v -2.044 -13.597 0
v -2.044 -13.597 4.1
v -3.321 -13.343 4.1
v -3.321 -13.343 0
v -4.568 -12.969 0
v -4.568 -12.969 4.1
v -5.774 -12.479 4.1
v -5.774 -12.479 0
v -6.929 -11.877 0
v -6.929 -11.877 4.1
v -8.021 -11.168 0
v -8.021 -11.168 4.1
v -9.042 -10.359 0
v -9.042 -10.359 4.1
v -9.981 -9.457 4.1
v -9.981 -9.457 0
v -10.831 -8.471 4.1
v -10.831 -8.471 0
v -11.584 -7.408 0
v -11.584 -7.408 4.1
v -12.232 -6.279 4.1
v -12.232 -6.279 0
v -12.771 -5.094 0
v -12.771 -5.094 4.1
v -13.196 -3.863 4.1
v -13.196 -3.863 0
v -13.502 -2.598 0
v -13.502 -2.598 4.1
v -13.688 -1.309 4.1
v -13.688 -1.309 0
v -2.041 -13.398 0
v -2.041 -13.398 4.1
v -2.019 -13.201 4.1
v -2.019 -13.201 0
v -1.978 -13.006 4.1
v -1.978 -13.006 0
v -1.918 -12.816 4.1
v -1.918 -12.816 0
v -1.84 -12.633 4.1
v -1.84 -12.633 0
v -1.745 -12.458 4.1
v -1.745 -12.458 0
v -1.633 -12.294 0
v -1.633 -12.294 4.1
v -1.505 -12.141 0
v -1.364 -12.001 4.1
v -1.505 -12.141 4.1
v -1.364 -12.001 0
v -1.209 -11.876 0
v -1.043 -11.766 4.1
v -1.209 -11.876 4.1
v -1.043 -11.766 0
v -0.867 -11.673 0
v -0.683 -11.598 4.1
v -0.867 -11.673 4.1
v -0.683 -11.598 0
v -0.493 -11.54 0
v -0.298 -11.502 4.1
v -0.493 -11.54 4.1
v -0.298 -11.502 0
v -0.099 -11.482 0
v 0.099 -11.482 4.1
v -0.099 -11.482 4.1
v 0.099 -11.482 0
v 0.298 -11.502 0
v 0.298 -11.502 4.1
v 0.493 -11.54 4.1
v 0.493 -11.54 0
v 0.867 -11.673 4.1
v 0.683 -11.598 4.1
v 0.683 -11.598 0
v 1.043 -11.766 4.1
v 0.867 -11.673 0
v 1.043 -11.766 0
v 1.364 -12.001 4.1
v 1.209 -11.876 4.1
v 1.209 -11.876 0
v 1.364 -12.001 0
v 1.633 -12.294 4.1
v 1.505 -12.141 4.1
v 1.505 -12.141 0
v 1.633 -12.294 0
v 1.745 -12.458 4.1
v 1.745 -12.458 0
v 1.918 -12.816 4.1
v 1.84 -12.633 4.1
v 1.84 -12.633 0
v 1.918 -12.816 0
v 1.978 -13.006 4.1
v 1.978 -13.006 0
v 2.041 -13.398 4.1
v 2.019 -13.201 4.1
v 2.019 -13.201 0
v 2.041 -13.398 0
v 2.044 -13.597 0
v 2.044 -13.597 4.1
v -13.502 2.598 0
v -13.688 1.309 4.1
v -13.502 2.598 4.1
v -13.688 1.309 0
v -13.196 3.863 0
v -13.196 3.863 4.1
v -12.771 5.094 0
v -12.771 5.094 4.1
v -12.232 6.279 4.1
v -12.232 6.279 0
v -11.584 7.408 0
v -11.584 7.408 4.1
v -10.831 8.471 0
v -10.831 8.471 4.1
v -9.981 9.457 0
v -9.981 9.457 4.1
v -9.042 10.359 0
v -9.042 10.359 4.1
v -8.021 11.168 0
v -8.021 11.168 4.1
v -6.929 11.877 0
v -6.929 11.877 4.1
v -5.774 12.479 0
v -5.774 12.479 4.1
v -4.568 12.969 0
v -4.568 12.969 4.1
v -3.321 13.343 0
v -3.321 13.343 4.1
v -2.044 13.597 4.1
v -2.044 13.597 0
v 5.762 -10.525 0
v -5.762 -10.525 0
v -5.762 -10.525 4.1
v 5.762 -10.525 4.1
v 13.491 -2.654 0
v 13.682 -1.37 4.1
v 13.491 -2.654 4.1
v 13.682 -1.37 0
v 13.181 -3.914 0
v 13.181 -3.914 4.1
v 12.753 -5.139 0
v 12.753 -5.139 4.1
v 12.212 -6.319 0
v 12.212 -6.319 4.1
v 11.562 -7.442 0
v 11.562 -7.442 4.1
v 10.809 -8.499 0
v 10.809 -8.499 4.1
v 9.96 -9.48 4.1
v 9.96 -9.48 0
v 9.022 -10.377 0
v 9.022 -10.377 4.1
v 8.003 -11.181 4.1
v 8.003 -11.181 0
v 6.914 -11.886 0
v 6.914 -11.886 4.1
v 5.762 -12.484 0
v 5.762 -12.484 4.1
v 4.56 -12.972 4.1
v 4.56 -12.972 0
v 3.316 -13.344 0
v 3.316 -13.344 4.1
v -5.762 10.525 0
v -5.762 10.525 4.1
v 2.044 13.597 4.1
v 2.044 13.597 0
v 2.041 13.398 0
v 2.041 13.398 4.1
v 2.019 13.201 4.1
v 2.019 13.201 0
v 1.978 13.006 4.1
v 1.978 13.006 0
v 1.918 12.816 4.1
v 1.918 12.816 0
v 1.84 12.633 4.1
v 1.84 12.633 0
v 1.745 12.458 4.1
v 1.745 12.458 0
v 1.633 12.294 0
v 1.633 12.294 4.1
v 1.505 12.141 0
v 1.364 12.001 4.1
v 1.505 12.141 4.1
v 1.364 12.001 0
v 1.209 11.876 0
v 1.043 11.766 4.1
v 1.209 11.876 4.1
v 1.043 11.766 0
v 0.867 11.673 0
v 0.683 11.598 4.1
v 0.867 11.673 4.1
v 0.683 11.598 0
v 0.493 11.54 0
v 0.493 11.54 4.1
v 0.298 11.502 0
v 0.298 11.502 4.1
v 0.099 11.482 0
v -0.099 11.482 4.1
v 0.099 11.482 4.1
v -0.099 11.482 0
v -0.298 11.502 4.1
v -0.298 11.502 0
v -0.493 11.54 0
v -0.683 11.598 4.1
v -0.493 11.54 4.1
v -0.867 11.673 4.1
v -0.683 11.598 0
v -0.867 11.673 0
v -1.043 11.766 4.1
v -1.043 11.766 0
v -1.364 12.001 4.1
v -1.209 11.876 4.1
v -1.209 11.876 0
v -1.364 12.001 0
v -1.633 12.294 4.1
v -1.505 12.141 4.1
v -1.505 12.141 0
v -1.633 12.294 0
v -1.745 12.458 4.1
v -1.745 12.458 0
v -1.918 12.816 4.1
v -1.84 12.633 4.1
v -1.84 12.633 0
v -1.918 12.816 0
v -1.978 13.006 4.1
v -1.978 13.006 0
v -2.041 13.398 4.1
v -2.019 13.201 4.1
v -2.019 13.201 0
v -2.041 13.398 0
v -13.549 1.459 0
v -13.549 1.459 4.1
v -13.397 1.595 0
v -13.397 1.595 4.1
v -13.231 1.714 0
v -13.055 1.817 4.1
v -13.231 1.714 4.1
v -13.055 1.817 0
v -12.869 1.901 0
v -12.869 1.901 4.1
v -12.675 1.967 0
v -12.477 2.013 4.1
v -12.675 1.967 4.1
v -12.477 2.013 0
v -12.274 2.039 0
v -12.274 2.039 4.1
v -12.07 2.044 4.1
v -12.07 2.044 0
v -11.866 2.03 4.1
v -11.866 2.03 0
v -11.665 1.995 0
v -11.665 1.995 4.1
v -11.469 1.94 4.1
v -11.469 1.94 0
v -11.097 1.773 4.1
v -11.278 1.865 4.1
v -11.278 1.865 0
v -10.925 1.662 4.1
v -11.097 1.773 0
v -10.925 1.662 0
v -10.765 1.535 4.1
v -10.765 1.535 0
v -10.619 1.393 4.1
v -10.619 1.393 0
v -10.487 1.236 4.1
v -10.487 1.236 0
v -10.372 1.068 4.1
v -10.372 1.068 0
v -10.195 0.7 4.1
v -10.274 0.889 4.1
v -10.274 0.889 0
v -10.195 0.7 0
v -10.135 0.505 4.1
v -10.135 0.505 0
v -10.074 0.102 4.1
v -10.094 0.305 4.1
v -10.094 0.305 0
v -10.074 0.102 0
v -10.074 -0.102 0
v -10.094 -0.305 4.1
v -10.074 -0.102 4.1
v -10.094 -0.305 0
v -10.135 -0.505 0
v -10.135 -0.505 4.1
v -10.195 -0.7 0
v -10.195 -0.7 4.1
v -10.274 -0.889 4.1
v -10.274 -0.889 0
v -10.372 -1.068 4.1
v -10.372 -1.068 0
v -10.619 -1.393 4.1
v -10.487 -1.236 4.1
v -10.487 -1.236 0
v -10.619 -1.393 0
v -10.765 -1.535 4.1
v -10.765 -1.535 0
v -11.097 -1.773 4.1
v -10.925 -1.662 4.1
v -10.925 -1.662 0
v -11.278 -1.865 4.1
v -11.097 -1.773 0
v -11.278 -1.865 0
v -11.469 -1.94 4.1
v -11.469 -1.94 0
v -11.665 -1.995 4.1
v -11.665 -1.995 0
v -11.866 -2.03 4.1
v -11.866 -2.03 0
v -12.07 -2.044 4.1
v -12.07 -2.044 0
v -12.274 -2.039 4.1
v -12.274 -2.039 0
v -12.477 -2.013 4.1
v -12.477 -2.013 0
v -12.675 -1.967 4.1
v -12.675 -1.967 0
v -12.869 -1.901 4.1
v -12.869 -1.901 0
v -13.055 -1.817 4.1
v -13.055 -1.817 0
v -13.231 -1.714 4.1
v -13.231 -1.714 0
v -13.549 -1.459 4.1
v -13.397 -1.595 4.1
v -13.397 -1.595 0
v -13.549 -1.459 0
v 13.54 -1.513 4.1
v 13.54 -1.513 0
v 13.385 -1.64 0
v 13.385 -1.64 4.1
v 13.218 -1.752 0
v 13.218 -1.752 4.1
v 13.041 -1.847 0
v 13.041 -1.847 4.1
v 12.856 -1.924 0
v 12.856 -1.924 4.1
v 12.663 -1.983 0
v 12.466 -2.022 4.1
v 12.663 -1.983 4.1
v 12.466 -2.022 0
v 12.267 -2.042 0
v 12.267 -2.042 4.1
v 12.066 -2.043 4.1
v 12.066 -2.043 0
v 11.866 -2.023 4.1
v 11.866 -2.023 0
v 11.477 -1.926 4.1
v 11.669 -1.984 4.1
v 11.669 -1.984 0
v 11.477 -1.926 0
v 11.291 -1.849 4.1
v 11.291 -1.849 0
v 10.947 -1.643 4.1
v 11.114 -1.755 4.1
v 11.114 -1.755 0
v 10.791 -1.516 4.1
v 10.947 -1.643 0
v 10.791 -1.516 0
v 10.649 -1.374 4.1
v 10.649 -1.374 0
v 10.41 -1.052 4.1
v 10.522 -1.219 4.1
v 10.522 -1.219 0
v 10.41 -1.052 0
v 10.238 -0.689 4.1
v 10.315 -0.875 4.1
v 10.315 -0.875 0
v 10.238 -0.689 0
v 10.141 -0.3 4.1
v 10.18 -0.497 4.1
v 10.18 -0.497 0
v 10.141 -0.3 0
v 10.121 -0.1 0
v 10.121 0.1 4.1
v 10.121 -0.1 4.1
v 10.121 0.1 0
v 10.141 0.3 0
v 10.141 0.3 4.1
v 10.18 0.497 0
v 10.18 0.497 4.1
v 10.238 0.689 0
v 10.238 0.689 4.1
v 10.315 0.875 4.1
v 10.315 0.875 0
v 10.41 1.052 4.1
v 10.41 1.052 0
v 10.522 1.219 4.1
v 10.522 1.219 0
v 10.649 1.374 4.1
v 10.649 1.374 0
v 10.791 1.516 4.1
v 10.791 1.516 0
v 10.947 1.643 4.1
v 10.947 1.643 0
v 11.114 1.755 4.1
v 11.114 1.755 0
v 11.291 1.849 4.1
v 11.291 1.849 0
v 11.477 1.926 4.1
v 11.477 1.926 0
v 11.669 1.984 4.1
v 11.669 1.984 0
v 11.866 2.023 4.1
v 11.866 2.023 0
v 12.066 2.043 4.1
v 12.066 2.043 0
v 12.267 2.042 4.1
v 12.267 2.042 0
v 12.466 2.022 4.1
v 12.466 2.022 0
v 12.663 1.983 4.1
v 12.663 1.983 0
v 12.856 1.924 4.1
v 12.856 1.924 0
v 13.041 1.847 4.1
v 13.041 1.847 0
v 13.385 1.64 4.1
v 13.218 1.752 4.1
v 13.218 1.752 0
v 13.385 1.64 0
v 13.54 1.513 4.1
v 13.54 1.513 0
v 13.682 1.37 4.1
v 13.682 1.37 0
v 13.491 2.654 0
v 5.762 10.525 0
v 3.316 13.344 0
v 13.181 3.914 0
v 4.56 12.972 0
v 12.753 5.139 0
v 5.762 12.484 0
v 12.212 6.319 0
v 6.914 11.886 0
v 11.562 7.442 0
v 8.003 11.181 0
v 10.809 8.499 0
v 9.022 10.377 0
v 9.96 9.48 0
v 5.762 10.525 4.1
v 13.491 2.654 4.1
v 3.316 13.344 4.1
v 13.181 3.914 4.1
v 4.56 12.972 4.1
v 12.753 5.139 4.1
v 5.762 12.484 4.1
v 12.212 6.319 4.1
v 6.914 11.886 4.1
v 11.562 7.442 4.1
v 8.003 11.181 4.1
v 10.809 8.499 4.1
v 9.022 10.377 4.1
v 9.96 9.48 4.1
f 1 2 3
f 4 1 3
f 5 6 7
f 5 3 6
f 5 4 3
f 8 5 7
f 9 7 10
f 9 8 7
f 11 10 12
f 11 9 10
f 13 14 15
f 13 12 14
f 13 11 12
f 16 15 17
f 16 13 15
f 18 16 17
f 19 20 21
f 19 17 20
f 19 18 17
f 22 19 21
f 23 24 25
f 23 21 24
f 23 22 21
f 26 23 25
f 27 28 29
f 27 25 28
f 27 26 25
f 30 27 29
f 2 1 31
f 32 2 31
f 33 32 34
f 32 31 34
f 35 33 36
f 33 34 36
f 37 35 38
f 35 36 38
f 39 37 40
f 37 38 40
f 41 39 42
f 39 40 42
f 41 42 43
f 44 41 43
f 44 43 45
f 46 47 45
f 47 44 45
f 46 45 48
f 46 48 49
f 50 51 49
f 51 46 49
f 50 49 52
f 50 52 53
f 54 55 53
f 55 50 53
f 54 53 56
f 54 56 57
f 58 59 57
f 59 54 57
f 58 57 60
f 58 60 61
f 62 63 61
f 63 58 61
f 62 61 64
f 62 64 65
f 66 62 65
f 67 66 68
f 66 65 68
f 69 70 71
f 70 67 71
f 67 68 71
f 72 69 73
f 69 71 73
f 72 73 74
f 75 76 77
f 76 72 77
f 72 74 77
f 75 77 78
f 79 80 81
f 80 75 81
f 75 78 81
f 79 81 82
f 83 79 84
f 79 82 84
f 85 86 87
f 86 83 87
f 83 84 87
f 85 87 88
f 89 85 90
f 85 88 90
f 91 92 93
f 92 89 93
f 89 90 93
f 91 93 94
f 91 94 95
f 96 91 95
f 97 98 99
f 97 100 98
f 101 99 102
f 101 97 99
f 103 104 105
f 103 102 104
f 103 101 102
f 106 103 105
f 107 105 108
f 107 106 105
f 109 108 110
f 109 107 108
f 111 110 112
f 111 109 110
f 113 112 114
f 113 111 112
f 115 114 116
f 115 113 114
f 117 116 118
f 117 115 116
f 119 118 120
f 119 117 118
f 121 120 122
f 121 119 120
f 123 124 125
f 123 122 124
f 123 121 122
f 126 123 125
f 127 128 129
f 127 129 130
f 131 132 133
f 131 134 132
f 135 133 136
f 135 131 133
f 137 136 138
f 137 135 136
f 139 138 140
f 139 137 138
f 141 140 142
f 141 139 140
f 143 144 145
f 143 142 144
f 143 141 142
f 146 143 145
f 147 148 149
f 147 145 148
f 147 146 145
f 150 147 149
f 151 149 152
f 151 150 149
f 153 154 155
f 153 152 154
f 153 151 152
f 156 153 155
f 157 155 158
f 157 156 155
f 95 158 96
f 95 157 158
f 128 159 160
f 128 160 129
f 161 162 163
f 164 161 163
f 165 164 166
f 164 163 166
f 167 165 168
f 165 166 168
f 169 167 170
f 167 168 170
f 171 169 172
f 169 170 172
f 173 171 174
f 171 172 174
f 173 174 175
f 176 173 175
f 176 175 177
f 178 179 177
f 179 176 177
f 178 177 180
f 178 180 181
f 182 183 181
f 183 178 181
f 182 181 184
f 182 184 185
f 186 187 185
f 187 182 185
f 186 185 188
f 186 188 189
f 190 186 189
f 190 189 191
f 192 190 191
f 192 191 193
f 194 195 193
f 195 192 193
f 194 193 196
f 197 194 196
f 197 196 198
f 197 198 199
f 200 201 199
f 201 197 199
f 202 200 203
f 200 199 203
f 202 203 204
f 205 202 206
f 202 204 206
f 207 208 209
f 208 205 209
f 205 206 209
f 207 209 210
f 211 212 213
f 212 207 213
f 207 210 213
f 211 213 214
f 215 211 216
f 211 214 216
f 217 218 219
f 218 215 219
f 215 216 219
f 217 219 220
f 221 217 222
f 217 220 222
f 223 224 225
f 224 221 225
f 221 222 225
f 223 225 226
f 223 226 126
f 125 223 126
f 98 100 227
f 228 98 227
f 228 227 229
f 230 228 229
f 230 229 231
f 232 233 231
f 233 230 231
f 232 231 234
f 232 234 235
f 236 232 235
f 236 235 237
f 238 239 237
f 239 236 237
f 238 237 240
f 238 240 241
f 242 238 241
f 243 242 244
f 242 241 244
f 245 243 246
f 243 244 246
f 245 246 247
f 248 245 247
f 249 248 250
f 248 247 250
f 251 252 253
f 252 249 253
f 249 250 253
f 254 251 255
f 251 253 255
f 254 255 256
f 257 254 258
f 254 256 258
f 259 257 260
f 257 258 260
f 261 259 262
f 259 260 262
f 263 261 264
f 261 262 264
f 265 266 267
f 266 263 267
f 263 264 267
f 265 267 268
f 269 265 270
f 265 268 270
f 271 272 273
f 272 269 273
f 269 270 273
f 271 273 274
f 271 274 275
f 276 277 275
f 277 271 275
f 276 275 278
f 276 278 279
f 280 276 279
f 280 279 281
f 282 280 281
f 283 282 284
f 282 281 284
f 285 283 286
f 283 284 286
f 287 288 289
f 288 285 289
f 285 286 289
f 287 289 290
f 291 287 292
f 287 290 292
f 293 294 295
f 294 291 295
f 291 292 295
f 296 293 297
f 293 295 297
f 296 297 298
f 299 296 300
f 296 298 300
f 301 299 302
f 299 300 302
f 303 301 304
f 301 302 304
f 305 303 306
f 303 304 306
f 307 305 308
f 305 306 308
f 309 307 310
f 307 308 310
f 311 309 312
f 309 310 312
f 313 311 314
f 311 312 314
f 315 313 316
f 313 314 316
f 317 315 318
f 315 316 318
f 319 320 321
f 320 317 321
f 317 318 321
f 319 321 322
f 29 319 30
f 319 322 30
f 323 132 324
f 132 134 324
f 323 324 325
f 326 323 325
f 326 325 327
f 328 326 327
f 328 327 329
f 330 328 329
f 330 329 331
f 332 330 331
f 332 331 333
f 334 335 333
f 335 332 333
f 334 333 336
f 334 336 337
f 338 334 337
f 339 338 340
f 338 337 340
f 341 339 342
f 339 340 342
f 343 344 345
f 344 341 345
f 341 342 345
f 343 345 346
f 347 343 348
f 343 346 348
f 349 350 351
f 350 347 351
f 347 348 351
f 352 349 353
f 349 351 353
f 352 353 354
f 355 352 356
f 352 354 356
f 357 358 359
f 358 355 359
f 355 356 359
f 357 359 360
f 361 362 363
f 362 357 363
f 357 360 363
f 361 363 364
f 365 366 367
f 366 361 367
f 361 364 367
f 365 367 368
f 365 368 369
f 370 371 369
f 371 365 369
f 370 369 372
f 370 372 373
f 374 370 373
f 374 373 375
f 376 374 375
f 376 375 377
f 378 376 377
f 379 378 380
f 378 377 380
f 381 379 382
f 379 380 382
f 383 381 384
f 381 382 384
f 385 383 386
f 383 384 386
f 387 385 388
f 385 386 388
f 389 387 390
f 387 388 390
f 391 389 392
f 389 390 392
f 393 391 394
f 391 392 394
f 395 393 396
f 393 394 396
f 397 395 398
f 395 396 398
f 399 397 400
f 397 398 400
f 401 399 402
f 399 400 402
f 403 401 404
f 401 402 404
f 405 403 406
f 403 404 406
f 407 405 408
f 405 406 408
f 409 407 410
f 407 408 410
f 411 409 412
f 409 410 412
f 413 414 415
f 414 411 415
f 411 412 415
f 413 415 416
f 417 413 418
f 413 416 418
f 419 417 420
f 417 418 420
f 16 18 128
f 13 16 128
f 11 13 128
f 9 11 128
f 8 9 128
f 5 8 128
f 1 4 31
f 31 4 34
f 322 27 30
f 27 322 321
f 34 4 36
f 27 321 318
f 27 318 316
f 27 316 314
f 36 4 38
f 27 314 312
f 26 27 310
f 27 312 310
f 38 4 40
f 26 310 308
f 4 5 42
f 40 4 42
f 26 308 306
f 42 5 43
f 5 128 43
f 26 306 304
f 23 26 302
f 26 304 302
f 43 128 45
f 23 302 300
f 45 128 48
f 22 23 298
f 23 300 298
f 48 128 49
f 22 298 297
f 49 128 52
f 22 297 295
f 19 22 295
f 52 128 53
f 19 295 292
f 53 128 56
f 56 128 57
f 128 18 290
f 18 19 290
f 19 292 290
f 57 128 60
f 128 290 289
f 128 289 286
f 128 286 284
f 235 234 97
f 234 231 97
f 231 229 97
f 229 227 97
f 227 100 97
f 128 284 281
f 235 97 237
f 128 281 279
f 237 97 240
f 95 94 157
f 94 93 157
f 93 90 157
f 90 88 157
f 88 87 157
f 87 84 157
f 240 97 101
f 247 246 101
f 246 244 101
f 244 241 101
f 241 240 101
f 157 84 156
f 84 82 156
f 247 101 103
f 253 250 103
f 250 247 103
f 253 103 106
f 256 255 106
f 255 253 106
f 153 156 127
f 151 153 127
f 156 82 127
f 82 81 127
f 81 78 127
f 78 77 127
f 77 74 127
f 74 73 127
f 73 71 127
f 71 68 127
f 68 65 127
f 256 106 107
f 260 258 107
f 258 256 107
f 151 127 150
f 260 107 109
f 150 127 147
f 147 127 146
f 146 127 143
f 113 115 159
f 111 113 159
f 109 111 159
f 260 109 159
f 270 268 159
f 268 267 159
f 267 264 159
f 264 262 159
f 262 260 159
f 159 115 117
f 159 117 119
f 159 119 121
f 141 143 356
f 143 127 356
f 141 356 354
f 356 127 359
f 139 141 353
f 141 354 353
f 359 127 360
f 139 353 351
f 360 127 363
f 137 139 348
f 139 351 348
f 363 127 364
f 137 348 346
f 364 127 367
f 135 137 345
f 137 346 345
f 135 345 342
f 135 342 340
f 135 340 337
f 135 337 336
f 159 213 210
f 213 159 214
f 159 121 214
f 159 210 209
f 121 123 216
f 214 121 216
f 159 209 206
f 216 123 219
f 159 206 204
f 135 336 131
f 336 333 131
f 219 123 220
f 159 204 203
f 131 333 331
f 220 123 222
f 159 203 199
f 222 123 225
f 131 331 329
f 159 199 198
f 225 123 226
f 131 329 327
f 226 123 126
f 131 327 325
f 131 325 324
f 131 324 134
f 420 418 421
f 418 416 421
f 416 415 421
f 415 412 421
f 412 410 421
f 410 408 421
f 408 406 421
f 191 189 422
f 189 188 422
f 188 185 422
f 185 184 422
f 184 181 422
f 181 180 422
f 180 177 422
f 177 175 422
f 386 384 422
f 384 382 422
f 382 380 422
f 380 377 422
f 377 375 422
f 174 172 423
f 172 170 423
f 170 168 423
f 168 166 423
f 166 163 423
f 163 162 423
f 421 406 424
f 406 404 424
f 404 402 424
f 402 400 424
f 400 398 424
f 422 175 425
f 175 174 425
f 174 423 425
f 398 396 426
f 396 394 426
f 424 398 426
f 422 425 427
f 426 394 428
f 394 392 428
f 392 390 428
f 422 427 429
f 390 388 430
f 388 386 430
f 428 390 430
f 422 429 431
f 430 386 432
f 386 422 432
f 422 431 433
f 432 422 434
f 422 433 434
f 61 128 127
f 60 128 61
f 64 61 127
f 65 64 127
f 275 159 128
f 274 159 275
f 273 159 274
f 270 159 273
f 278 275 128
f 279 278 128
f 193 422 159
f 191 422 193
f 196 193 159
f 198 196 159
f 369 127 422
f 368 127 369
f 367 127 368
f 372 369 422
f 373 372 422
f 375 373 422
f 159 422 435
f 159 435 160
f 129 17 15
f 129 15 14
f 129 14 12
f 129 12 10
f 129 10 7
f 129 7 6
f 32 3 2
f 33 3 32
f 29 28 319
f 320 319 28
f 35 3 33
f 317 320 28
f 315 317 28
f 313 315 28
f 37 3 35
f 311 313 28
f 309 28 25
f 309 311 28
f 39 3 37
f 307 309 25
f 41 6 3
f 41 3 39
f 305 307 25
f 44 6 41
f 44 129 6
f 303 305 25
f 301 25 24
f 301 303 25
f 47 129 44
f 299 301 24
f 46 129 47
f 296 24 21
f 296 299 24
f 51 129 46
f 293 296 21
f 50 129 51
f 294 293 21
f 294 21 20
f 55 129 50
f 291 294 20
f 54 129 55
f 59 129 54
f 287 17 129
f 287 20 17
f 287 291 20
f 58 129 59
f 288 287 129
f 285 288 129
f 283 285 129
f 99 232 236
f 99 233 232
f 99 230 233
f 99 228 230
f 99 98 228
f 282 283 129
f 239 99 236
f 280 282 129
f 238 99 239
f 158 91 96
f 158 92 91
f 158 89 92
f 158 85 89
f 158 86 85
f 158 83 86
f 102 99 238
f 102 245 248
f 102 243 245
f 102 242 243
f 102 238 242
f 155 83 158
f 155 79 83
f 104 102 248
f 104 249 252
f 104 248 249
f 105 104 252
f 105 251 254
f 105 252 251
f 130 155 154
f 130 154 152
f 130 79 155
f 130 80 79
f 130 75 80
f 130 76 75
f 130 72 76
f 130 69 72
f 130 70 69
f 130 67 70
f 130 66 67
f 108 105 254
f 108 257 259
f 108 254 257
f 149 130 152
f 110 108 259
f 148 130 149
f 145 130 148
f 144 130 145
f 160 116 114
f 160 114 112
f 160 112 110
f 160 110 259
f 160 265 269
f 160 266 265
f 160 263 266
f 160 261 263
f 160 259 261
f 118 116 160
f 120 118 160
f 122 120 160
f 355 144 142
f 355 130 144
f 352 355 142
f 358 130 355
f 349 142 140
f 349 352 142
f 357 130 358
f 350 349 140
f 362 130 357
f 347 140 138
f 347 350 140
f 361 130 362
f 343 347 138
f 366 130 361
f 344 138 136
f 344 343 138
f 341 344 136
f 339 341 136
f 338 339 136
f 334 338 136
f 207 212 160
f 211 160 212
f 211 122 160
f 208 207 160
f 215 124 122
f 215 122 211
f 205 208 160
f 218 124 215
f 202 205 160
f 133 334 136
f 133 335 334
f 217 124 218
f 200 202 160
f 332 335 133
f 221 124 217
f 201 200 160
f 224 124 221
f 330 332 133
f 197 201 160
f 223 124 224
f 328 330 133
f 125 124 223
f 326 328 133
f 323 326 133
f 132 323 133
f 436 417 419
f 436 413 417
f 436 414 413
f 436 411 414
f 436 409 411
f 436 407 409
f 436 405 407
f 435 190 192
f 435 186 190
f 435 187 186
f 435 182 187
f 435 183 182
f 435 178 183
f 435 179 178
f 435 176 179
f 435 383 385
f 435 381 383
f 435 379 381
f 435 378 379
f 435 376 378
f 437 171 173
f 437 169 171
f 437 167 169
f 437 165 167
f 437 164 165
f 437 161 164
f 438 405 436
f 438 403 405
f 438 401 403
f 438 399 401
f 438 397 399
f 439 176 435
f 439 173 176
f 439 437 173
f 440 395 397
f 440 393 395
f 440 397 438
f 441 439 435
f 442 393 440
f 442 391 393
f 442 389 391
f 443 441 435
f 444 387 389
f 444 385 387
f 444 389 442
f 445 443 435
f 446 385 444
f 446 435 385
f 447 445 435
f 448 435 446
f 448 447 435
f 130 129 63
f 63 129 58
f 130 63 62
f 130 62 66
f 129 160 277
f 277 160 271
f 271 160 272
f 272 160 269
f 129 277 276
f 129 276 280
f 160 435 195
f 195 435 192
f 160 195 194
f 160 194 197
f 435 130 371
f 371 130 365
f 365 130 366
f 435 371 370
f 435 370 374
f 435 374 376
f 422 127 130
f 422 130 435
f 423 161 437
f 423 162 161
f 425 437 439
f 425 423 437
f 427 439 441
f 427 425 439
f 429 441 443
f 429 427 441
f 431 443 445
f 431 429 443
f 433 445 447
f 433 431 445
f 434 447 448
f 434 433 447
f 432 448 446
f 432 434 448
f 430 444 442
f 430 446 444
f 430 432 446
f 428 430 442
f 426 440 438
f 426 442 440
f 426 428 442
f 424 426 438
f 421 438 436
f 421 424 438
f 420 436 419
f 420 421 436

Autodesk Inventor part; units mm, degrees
ref_plane "YZ Plane" through (0, 0, 0) normal (1, 0, 0) x (0, 1, 0)
ref_plane "XZ Plane" through (0, 0, 0) normal (0, 1, 0) x (-1, 0, 0)
ref_plane "XY Plane" through (0, 0, 0) normal (0, 0, 1) x (1, 0, 0)
sketch "Sketch3" plane through (0, 0, 0) normal (0, 0, 1) x (1, 0, 0)
  line L0 (-15.9263, -16.7) -> (16.0737, -16.7)
  line L1 (16.7744, -15.9999) -> (16.6729, 15.9999)
  line L2 (15.9735, 16.7) -> (-16.0265, 16.7)
  line L3 (-16.7272, 15.9999) -> (-16.6257, -15.9999)
  line L4 (-16.0265, 16.7) -> (-16.7272, 15.9999)
  line L5 (15.9735, 16.7) -> (16.6729, 15.9999)
  line L6 (16.7744, -15.9999) -> (16.0737, -16.7)
  line L7 (-16.6257, -15.9999) -> (-15.9263, -16.7)
  line L8 (-5.7625, -10.525) -> (5.7625, -10.525)
  line L9 (5.7625, -10.525) -> (5.7625, 10.525)
  line L10 (5.7625, 10.525) -> (-5.7625, 10.525)
  line L11 (-5.7625, 10.525) -> (-5.7625, -10.525)
  circle A0 centre (-12.159, 13.525) radius 2.045
  circle A1 centre (12.121, 13.525) radius 2.045
  circle A2 centre (-12.0777, -13.525) radius 2.045
  circle A3 centre (12.2023, -13.525) radius 2.045
  circle A4 centre (0, 0) radius 18.4 construction
  circle A5 centre (-12.1163, 0) radius 2.045
  circle A6 centre (0, 13.525) radius 2.045
  circle A7 centre (12.1637, 0) radius 2.045
  circle A8 centre (0, -13.525) radius 2.045
  dimension "d10" = 11.525
  dimension "d11" = 21.05
  dimension "d12" = 4.09
  dimension "d13" = 4.09
  dimension "d17" = 4.09
  dimension "d19" = 24.28
  dimension "d21" = 4.09
  dimension "d26" = 36.8
  dimension "d27" = 4.09
  dimension "d28" = 4.09
  dimension "d29" = 4.09
  dimension "d33" = 4.09
  dimension "d38" = 10.525
  dimension "d39" = 5.7625
  dimension "d45" = 33.4
  dimension "d46" = 33.4
  dimension "d47" = 32
  dimension "d48" = 32
  dimension "d49" = 32
  dimension "d50" = 32
  dimension "d52" = 3
  dimension "d53" = 3
  dimension "d55" = 3
  dimension "d56" = 3
  dimension "d57" = 3
  dimension "d59" = 3
  dimension "d60" = 5.7625
  dimension "d61" = 5.7625
  dimension "d62" = 6.3585
  dimension "d63" = 24.28
  dimension "d64" = 24.28
  dimension "d66" = 10.525
  dimension "d67" = 16.7
sketch "Sketch4" plane through (0, 0, 0) normal (0, 0, 1) x (1, 0, 0)
  circle A0 centre (0, 0) radius 13.75
  dimension "d32" = 27.5
extrude "Extrusion3" add sketch "Sketch3" along normal blind 4.1
extrude "Extrusion4" cut sketch "Sketch4" along normal blind 4.1 keep common part
properties part number "WG18FLANGECutDown"
